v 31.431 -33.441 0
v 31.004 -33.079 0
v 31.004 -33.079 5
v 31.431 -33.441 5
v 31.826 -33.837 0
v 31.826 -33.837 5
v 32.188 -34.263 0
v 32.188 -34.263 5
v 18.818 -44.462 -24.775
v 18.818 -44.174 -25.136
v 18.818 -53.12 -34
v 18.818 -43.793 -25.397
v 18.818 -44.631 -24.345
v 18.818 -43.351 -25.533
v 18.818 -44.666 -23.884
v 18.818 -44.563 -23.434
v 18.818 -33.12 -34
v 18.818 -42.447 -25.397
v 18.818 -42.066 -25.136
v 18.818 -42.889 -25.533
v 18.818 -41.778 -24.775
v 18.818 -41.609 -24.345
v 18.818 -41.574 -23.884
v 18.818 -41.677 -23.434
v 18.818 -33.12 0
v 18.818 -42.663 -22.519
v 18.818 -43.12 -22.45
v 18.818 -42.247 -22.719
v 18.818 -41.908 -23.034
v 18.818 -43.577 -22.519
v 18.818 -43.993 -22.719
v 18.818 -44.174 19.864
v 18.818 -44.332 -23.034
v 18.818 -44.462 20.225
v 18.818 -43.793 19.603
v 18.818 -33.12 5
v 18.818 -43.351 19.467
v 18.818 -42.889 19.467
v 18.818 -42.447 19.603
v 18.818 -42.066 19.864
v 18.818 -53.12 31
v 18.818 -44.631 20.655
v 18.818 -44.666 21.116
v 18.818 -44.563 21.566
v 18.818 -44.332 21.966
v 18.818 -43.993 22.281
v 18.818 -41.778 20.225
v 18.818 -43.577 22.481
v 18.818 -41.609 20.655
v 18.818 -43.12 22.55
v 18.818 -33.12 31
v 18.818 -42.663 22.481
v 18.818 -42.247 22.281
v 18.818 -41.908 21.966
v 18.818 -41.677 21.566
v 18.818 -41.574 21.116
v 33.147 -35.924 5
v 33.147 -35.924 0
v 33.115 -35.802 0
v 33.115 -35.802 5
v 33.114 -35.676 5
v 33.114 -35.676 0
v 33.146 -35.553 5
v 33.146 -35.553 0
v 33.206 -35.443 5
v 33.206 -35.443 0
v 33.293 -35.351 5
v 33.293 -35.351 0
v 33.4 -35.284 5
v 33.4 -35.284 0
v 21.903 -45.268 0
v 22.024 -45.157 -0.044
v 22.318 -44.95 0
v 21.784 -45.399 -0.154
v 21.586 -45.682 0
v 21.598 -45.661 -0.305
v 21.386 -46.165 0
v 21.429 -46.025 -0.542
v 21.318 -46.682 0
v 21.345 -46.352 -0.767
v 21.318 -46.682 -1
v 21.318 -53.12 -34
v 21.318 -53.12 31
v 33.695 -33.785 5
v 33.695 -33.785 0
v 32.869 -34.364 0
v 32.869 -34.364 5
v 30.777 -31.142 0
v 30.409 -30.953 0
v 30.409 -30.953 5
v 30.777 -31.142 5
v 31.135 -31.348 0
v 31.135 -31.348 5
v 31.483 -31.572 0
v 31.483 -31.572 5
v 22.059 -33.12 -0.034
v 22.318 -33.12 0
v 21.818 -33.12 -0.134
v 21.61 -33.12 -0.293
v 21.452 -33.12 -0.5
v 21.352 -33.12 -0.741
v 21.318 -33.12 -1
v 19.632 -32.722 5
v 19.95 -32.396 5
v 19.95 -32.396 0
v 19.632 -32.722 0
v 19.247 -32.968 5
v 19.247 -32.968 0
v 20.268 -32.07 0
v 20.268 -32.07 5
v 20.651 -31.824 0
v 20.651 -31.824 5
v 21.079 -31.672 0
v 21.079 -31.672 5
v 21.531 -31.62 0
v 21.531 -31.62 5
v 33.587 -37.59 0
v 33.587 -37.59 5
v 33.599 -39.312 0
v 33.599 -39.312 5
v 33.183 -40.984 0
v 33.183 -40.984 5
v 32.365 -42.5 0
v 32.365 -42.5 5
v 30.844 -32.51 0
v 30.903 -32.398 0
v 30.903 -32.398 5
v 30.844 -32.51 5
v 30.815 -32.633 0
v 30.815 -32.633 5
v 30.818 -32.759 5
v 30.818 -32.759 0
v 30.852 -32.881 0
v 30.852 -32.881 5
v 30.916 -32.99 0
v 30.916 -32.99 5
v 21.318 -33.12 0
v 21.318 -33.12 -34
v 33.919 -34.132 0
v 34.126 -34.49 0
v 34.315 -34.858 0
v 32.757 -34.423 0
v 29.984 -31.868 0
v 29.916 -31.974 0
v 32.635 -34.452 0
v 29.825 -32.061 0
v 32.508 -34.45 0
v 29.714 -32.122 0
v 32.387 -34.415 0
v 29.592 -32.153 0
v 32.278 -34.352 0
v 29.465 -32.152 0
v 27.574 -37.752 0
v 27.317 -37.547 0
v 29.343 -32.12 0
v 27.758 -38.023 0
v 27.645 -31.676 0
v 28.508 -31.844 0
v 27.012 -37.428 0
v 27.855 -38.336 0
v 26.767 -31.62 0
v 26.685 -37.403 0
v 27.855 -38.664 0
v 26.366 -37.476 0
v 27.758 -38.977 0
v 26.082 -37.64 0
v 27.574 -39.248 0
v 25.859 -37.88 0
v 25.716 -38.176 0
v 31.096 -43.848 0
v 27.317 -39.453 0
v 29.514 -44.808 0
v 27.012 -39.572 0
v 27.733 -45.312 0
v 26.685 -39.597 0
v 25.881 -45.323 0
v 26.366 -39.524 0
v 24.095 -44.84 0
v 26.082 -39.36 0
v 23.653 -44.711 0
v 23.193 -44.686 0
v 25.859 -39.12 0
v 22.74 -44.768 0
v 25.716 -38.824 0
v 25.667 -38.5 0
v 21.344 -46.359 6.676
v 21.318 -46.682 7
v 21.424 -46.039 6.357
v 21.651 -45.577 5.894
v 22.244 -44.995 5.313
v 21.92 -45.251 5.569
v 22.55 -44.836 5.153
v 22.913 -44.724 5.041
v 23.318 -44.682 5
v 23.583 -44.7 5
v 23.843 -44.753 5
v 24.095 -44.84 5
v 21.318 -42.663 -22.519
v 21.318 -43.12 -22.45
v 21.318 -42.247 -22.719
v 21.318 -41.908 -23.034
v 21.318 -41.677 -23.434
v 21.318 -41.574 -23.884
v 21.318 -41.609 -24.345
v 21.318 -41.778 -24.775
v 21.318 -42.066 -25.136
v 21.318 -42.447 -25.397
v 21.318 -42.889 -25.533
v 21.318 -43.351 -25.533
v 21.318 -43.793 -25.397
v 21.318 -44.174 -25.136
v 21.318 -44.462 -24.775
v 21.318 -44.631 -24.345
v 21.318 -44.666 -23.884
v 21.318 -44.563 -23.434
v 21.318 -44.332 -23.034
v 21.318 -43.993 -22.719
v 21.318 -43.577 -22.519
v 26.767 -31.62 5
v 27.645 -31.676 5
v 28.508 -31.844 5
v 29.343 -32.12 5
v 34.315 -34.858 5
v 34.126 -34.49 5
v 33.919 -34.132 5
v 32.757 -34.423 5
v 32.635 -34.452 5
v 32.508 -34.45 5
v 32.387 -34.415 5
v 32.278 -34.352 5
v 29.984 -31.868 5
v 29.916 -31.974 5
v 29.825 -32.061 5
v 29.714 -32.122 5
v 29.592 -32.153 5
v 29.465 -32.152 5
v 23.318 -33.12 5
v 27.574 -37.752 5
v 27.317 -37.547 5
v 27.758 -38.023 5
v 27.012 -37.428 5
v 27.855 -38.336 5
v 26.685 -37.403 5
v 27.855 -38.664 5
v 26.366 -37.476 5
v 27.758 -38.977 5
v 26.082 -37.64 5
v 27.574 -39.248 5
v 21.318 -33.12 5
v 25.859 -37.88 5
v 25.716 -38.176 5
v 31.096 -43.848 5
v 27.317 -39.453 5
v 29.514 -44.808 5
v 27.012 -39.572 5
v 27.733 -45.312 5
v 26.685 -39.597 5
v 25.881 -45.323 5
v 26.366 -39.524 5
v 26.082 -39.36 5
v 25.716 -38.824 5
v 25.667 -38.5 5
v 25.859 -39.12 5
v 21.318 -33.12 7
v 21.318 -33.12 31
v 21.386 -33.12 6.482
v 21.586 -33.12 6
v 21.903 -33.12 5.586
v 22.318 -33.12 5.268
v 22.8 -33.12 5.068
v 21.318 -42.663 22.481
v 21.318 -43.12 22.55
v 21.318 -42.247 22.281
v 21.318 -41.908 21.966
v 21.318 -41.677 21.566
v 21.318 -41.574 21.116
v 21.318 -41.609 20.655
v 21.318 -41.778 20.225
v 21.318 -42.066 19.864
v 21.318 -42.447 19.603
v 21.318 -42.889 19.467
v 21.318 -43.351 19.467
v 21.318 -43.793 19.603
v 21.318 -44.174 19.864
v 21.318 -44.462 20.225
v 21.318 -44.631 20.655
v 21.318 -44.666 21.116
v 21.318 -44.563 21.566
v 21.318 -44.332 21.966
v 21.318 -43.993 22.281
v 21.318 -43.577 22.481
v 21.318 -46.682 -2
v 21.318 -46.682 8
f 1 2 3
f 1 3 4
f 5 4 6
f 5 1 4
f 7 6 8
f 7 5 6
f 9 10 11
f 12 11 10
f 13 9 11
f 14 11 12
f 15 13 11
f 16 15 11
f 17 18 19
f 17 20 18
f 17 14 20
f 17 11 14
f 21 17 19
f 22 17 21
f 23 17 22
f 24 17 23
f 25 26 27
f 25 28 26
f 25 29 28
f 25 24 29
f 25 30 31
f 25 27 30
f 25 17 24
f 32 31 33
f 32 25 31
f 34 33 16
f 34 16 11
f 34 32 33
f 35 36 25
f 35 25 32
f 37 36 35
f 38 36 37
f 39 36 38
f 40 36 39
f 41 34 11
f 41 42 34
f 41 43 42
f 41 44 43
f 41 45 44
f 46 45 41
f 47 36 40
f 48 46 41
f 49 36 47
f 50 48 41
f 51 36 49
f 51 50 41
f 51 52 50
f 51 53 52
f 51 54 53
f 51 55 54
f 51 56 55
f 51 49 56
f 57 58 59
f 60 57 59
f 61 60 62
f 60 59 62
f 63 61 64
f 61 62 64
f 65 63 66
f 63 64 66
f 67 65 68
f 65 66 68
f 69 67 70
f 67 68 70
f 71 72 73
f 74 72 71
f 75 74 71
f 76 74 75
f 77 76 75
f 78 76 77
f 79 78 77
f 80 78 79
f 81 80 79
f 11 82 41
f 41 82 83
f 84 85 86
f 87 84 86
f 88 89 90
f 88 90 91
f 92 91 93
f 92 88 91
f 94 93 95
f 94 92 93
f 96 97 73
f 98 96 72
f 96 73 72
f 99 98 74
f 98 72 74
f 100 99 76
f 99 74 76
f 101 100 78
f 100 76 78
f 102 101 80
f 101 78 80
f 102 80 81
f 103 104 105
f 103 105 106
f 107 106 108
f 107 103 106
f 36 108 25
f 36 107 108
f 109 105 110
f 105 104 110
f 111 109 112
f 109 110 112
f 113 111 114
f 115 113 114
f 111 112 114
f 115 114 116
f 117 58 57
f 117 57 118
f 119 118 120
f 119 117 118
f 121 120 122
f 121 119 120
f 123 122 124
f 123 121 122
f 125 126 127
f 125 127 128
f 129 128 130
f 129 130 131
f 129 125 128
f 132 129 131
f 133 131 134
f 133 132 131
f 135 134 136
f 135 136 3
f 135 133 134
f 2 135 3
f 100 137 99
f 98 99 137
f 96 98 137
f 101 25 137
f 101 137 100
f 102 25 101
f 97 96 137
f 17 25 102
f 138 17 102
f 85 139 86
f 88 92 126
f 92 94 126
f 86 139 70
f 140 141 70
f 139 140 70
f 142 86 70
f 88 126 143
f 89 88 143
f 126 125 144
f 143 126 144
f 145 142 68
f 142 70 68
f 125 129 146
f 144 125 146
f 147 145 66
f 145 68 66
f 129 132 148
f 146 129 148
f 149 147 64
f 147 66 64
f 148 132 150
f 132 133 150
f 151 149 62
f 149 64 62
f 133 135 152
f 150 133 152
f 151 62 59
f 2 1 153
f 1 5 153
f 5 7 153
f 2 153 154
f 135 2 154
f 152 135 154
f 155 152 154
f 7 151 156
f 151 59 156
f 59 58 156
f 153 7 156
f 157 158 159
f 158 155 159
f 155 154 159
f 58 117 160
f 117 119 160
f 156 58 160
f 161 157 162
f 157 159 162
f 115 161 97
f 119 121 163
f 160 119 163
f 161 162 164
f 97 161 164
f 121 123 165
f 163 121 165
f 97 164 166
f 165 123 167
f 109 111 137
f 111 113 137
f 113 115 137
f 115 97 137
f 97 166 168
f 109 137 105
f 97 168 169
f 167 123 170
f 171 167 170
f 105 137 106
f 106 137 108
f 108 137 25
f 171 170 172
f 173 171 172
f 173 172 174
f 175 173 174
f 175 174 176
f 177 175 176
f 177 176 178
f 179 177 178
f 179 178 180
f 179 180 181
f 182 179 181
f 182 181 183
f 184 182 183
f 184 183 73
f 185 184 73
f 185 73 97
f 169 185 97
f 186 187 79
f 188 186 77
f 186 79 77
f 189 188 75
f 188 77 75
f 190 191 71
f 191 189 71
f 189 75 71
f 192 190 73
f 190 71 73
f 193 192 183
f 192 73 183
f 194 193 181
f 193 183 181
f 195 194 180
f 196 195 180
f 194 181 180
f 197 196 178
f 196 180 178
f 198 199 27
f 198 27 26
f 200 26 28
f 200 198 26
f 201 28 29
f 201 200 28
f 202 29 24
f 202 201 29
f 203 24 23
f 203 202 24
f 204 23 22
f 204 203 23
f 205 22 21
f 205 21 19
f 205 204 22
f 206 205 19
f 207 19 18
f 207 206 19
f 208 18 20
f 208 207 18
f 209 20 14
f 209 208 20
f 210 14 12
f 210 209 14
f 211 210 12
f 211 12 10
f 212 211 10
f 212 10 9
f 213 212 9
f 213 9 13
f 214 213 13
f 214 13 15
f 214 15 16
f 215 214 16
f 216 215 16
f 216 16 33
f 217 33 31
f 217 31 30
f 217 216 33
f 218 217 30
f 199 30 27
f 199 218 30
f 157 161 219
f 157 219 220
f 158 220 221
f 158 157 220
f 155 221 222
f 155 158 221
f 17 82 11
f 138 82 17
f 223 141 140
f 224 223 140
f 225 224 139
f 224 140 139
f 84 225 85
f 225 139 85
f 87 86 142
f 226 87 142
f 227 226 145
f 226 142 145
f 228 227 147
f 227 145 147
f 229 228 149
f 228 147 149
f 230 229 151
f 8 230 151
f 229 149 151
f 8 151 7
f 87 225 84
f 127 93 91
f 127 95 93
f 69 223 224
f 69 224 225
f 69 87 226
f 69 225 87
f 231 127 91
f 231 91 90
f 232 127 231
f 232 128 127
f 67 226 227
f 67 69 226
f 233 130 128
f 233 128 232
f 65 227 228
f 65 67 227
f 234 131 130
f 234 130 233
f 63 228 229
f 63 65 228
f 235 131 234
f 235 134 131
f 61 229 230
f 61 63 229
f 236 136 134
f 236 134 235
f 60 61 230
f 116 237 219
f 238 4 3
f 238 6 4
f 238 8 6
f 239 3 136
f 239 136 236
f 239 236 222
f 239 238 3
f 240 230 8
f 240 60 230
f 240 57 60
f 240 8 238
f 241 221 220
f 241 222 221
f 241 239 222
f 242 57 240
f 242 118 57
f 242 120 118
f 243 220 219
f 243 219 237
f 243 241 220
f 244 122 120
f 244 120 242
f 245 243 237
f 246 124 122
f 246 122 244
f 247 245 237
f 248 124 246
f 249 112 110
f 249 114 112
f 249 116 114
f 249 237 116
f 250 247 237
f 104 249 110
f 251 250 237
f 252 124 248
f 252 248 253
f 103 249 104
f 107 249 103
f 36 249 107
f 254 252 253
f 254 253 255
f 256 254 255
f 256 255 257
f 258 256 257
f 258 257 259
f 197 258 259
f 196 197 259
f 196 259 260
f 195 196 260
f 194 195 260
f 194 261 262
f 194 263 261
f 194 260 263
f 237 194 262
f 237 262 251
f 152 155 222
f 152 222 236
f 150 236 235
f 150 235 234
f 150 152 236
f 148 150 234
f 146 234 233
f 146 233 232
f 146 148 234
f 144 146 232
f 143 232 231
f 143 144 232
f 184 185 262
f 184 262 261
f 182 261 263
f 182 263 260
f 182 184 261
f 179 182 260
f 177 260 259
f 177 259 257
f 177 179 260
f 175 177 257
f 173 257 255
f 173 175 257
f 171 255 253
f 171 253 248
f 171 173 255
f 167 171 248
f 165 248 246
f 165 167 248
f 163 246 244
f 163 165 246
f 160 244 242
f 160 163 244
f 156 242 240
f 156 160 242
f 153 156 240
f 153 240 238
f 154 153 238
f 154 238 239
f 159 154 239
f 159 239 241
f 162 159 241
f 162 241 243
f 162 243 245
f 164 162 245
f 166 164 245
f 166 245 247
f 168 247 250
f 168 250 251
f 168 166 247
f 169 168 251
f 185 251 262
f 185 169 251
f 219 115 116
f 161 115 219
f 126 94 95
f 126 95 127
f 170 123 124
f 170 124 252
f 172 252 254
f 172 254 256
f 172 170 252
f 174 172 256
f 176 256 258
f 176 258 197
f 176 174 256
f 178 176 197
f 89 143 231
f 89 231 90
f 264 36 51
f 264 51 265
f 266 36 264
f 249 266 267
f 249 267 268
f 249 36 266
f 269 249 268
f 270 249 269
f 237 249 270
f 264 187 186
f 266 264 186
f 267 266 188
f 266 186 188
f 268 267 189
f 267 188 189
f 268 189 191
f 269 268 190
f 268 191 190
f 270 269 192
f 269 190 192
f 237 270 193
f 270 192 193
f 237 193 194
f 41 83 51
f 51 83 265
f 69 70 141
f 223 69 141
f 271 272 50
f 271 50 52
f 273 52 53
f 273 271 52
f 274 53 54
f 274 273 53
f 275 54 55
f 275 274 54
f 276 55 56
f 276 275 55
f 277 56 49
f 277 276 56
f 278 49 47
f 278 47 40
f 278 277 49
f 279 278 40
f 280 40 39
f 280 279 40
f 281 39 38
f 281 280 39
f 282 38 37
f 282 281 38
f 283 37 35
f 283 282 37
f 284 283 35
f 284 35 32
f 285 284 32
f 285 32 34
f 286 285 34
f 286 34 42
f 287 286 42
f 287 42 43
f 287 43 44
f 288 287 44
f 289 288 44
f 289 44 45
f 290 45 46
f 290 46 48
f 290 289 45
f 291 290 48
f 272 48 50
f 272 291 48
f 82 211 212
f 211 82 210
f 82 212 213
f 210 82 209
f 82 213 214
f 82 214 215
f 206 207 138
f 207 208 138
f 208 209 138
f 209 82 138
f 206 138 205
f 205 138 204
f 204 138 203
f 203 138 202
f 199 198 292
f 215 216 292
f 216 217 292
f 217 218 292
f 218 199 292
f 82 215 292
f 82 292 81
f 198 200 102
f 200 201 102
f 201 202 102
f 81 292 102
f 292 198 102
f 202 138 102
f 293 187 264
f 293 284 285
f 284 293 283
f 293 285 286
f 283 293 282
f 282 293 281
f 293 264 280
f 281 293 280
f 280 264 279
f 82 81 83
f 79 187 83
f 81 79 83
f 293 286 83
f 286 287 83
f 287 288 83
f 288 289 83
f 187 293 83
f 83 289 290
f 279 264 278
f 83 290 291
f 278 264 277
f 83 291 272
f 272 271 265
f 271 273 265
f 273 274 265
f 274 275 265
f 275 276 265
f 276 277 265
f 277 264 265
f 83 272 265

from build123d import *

# Parameters (mm, degrees)
SKETCH2_R                = 1.1
BOSS_EXTRUDE1_DEPTH      = 5
BOSS_EXTRUDE2_DEPTH      = 1.5
BOSS_EXTRUDE2_DEPTH_BACK = 1
SKETCH4_W                = 65
SKETCH4_H                = 20
SKETCH4_R                = 1.55
FILLET1_R                = 2
FILLET2_R                = 2
FILLET3_DEPTH            = 5
FILLET3_START            = -46.68249578
FILLET3_2_DEPTH          = 13.56249578
FILLET3_START_2          = 5
FILLET3_3_DEPTH          = 3
FILLET4_START            = -44.68249568
FILLET4_DEPTH            = 11.56249568
FILLET4_START_2          = -46.68249588
FILLET4_2_DEPTH          = 2.0000002
FILLET4_START_3          = -2
FILLET4_3_DEPTH          = 2
BOSS_EXTRUDE3_START      = -5
BOSS_EXTRUDE3_DEPTH      = 5


with BuildPart() as part:
    # Sketch2 → Boss-Extrude1 (new body)
    with BuildSketch(Plane.XY):
        with BuildLine():
            Line((20.317595566, -31.62), (26.767401765, -31.62))
            ThreePointArc((26.767401765, -31.62), (28.079366857, -31.746249368), (29.343182309, -32.120364071))
            ThreePointArc((29.343182309, -32.120364071), (29.713933476, -32.121815396), (29.983758291, -31.867545651))
            Line((29.983758291, -31.867545651), (30.409159516, -30.952682564))
            ThreePointArc((30.409159516, -30.952682564), (30.957401765, -31.242707116), (31.482691519, -31.572486555))
            Line((31.482691519, -31.572486555), (30.903097457, -32.398326366))
            ThreePointArc((30.903097457, -32.398326366), (30.817805806, -32.759136383), (31.004438274, -33.07949065))
            ThreePointArc((31.004438274, -33.07949065), (33.576739296, -37.51647451), (32.365115584, -42.5))
            ThreePointArc((32.365115584, -42.5), (27.155948468, -45.369019687), (21.656472124, -43.105735361))
            Line((21.656472124, -43.105735361), (20.317595566, -41.62))
            Line((20.317595566, -41.62), (20.317595566, -31.62))
        make_face()
        with Locations(Location((26.767401765, -38.5, 0), (0, 0, 180))):
            Circle(SKETCH2_R, mode=Mode.SUBTRACT)
    extrude(amount=BOSS_EXTRUDE1_DEPTH)

    # Sketch4 → Boss-Extrude2 (add, two sides: drawn at the far end of the back side and taken through both)
    with BuildSketch(Plane.ZY.offset(-20.317595566).offset(-BOSS_EXTRUDE2_DEPTH_BACK)):
        with Locations((-1.5, -43.12)):
            Rectangle(SKETCH4_W, SKETCH4_H)
        with Locations((21, -43.12)):
            Circle(SKETCH4_R, mode=Mode.SUBTRACT)
        with Locations((-24, -43.12)):
            Circle(SKETCH4_R, mode=Mode.SUBTRACT)
    extrude(amount=BOSS_EXTRUDE2_DEPTH + BOSS_EXTRUDE2_DEPTH_BACK)

    # Fillet1
    # the kernel refuses this fillet: 2 mm, written as the material it adds along each edge
    with BuildSketch(Plane(origin=(20.317595566, -33.12, 5), x_dir=(0, 1, 0), z_dir=(0, 0, -1))) as fillet1_piece_1:
        with BuildLine():
            CenterArc((1.948957881, -1.948957881), FILLET1_R, 102.972239886, 64.055520228)
            Line((0, -1.5), (0, 0))
            Line((0, 0), (1.5, 0))
        make_face()
    extrude(amount=5)

    # Fillet2
    fillet2_edges = [part.edges().sort_by_distance(p)[0] for p in [
        (20.317595566, -31.62, 2.5),
    ]]
    fillet(fillet2_edges, radius=FILLET2_R)

    # Fillet3: read off the stored shape, not the designer's step
    # Fillet3 outline → Fillet3 (add)
    with BuildSketch(Plane.XY):
        with BuildLine():
            Line((21.317595566, -42.729688082), (21.317595566, -46.68249578))
            ThreePointArc((21.317595566, -46.68249578), (22.211694747, -45.01606745), (24.094578944, -44.839591325))
            ThreePointArc((24.094578944, -44.839591325), (22.780138954, -44.106793672), (21.656472124, -43.105735361))
            Line((21.656472124, -43.105735361), (21.317595566, -42.729688082))
        make_face()
    extrude(amount=FILLET3_DEPTH)

    # Fillet3 2 outline → Fillet3 2 (add)
    with BuildSketch(Plane(origin=(0, 0, 0), x_dir=(1, 0, 0), z_dir=(0, 1, 0)).offset(FILLET3_START)):
        with BuildLine():
            Line((21.317595566, -5), (21.317595566, -7))
            ThreePointArc((21.317595566, -7), (21.903382004, -5.585786438), (23.317595566, -5))
            Line((23.317595566, -5), (21.317595566, -5))
        make_face()
    extrude(amount=FILLET3_2_DEPTH)

    # Fillet3 3 outline → Fillet3 3 (cut)
    with BuildSketch(Plane.XY.offset(FILLET3_START_2)):
        with BuildLine():
            ThreePointArc((24.094578944, -44.839591325), (22.211694747, -45.01606745), (21.317595566, -46.68249578))
            Line((21.317595566, -46.68249578), (25, -46.68249578))
            Line((25, -46.68249578), (25, -45.221324143))
            Line((25, -45.221324143), (24.094578944, -44.839591325))
        make_face()
    extrude(amount=FILLET3_3_DEPTH, mode=Mode.SUBTRACT)

    # Fillet4: read off the stored shape, not the designer's step
    # Fillet4 outline → Fillet4 (add)
    with BuildSketch(Plane(origin=(0, 0, 0), x_dir=(1, 0, 0), z_dir=(0, 1, 0)).offset(FILLET4_START)):
        with BuildLine():
            ThreePointArc((22.317595566, 0), (21.610488785, 0.292893219), (21.317595566, 1))
            Line((21.317595566, 1), (21.317595566, 0))
            Line((21.317595566, 0), (22.317595566, 0))
        make_face()
    extrude(amount=FILLET4_DEPTH)

    # Fillet4 2 outline → Fillet4 2 (add)
    with BuildSketch(Plane(origin=(0, 0, 0), x_dir=(1, 0, 0), z_dir=(0, 1, 0)).offset(FILLET4_START_2)):
        with BuildLine():
            ThreePointArc((22.317595566, 0), (21.610488785, 0.292893219), (21.317595566, 1))
            Line((21.317595566, 1), (21.317595566, 0))
            Line((21.317595566, 0), (22.317595566, 0))
        make_face()
    extrude(amount=FILLET4_2_DEPTH)

    # Fillet4 3 outline → Fillet4 3 (cut)
    with BuildSketch(Plane.XY.offset(FILLET4_START_3)):
        with BuildLine():
            ThreePointArc((24, -44.802515943), (22.169729909, -45.044691019), (21.317595566, -46.68249578))
            Line((21.317595566, -46.68249578), (24, -46.68249588))
            Line((24, -46.68249588), (24, -44.802515943))
        make_face()
    extrude(amount=FILLET4_3_DEPTH, mode=Mode.SUBTRACT)

    # Sketch5 → Boss-Extrude3 (add)
    with BuildSketch(Plane(origin=(0, 0, 5), x_dir=(-1, 0, 0), z_dir=(0, 0, 1)).offset(BOSS_EXTRUDE3_START)):
        with BuildLine():
            Line((-33.69491521, 33.784710246), (-32.869075399, 34.364304307))
            ThreePointArc((-32.869075399, 34.364304307), (-32.508265382, 34.449595959), (-32.187911115, 34.262963491))
            Line((-32.187911115, 34.262963491), (-31.321885711, 34.762963491))
            Line((-31.321885711, 34.762963491), (-32.28101229, 36.424219456))
            Line((-32.28101229, 36.424219456), (-33.147037694, 35.924219456))
            ThreePointArc((-33.147037694, 35.924219456), (-33.145586368, 35.553468289), (-33.399856114, 35.283643474))
            Line((-33.399856114, 35.283643474), (-34.314719201, 34.858242249))
            ThreePointArc((-34.314719201, 34.858242249), (-34.024694648, 34.31), (-33.69491521, 33.784710246))
        make_face()
    extrude(amount=BOSS_EXTRUDE3_DEPTH)


solid = part.part
